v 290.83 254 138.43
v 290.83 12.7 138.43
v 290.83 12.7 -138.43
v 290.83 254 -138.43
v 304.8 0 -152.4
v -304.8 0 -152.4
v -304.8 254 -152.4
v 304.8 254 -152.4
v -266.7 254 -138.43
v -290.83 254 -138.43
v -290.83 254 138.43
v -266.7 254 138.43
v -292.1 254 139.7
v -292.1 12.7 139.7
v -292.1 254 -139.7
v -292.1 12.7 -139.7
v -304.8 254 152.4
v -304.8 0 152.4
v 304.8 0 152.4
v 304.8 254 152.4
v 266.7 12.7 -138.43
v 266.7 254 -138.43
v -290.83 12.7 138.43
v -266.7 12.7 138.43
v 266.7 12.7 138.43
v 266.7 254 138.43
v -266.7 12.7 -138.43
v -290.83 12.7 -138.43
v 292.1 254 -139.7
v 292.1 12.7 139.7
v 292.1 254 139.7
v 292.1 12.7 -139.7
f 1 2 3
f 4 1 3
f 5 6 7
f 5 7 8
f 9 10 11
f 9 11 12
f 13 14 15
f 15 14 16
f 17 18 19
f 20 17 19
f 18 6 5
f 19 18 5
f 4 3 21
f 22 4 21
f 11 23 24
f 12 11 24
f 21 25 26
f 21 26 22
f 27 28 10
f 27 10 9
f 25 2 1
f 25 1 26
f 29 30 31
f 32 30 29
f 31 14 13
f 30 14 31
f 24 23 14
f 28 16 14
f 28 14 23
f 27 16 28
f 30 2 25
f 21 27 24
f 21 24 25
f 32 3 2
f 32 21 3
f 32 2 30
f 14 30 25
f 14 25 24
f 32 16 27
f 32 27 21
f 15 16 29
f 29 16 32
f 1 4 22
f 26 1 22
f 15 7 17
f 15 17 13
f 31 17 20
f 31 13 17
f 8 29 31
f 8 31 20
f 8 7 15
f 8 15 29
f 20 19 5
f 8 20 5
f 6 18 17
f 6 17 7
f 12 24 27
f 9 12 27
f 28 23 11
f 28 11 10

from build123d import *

# Parameters (mm, degrees)
SKETCH1_W           = 609.6
SKETCH1_H           = 304.8
BOSS_EXTRUDE1_DEPTH = 254
SHELL1_T            = -12.7
SKETCH2_W           = 24.13
SKETCH2_H           = 276.86
BOSS_EXTRUDE3_DEPTH = 241.3


with BuildPart() as part:
    # Sketch1 → Boss-Extrude1 (new body)
    with BuildSketch(Plane(origin=(0, 0, 0), x_dir=(1, 0, 0), z_dir=(0, 1, 0))):
        Rectangle(SKETCH1_W, SKETCH1_H)
    extrude(amount=BOSS_EXTRUDE1_DEPTH)

    # Shell1
    shell1_openings = [part.faces().sort_by_distance(p)[0] for p in [
        (0, 254, 0),
    ]]
    offset(amount=SHELL1_T, openings=shell1_openings, kind=Kind.INTERSECTION)

    # Sketch2 → Boss-Extrude3 (add)
    with BuildSketch(Plane(origin=(0, 12.7, 0), x_dir=(1, 0, 0), z_dir=(0, 1, 0))):
        with Locations((-278.765, 0)):
            Rectangle(SKETCH2_W, SKETCH2_H)
    boss_extrude3 = extrude(amount=BOSS_EXTRUDE3_DEPTH)

    # Mirror1: Boss-Extrude3 across plane
    add(boss_extrude3.mirror(Plane(origin=(0, 0, 0), x_dir=(0, 0, 1), z_dir=(1, 0, 0))))


solid = part.part
